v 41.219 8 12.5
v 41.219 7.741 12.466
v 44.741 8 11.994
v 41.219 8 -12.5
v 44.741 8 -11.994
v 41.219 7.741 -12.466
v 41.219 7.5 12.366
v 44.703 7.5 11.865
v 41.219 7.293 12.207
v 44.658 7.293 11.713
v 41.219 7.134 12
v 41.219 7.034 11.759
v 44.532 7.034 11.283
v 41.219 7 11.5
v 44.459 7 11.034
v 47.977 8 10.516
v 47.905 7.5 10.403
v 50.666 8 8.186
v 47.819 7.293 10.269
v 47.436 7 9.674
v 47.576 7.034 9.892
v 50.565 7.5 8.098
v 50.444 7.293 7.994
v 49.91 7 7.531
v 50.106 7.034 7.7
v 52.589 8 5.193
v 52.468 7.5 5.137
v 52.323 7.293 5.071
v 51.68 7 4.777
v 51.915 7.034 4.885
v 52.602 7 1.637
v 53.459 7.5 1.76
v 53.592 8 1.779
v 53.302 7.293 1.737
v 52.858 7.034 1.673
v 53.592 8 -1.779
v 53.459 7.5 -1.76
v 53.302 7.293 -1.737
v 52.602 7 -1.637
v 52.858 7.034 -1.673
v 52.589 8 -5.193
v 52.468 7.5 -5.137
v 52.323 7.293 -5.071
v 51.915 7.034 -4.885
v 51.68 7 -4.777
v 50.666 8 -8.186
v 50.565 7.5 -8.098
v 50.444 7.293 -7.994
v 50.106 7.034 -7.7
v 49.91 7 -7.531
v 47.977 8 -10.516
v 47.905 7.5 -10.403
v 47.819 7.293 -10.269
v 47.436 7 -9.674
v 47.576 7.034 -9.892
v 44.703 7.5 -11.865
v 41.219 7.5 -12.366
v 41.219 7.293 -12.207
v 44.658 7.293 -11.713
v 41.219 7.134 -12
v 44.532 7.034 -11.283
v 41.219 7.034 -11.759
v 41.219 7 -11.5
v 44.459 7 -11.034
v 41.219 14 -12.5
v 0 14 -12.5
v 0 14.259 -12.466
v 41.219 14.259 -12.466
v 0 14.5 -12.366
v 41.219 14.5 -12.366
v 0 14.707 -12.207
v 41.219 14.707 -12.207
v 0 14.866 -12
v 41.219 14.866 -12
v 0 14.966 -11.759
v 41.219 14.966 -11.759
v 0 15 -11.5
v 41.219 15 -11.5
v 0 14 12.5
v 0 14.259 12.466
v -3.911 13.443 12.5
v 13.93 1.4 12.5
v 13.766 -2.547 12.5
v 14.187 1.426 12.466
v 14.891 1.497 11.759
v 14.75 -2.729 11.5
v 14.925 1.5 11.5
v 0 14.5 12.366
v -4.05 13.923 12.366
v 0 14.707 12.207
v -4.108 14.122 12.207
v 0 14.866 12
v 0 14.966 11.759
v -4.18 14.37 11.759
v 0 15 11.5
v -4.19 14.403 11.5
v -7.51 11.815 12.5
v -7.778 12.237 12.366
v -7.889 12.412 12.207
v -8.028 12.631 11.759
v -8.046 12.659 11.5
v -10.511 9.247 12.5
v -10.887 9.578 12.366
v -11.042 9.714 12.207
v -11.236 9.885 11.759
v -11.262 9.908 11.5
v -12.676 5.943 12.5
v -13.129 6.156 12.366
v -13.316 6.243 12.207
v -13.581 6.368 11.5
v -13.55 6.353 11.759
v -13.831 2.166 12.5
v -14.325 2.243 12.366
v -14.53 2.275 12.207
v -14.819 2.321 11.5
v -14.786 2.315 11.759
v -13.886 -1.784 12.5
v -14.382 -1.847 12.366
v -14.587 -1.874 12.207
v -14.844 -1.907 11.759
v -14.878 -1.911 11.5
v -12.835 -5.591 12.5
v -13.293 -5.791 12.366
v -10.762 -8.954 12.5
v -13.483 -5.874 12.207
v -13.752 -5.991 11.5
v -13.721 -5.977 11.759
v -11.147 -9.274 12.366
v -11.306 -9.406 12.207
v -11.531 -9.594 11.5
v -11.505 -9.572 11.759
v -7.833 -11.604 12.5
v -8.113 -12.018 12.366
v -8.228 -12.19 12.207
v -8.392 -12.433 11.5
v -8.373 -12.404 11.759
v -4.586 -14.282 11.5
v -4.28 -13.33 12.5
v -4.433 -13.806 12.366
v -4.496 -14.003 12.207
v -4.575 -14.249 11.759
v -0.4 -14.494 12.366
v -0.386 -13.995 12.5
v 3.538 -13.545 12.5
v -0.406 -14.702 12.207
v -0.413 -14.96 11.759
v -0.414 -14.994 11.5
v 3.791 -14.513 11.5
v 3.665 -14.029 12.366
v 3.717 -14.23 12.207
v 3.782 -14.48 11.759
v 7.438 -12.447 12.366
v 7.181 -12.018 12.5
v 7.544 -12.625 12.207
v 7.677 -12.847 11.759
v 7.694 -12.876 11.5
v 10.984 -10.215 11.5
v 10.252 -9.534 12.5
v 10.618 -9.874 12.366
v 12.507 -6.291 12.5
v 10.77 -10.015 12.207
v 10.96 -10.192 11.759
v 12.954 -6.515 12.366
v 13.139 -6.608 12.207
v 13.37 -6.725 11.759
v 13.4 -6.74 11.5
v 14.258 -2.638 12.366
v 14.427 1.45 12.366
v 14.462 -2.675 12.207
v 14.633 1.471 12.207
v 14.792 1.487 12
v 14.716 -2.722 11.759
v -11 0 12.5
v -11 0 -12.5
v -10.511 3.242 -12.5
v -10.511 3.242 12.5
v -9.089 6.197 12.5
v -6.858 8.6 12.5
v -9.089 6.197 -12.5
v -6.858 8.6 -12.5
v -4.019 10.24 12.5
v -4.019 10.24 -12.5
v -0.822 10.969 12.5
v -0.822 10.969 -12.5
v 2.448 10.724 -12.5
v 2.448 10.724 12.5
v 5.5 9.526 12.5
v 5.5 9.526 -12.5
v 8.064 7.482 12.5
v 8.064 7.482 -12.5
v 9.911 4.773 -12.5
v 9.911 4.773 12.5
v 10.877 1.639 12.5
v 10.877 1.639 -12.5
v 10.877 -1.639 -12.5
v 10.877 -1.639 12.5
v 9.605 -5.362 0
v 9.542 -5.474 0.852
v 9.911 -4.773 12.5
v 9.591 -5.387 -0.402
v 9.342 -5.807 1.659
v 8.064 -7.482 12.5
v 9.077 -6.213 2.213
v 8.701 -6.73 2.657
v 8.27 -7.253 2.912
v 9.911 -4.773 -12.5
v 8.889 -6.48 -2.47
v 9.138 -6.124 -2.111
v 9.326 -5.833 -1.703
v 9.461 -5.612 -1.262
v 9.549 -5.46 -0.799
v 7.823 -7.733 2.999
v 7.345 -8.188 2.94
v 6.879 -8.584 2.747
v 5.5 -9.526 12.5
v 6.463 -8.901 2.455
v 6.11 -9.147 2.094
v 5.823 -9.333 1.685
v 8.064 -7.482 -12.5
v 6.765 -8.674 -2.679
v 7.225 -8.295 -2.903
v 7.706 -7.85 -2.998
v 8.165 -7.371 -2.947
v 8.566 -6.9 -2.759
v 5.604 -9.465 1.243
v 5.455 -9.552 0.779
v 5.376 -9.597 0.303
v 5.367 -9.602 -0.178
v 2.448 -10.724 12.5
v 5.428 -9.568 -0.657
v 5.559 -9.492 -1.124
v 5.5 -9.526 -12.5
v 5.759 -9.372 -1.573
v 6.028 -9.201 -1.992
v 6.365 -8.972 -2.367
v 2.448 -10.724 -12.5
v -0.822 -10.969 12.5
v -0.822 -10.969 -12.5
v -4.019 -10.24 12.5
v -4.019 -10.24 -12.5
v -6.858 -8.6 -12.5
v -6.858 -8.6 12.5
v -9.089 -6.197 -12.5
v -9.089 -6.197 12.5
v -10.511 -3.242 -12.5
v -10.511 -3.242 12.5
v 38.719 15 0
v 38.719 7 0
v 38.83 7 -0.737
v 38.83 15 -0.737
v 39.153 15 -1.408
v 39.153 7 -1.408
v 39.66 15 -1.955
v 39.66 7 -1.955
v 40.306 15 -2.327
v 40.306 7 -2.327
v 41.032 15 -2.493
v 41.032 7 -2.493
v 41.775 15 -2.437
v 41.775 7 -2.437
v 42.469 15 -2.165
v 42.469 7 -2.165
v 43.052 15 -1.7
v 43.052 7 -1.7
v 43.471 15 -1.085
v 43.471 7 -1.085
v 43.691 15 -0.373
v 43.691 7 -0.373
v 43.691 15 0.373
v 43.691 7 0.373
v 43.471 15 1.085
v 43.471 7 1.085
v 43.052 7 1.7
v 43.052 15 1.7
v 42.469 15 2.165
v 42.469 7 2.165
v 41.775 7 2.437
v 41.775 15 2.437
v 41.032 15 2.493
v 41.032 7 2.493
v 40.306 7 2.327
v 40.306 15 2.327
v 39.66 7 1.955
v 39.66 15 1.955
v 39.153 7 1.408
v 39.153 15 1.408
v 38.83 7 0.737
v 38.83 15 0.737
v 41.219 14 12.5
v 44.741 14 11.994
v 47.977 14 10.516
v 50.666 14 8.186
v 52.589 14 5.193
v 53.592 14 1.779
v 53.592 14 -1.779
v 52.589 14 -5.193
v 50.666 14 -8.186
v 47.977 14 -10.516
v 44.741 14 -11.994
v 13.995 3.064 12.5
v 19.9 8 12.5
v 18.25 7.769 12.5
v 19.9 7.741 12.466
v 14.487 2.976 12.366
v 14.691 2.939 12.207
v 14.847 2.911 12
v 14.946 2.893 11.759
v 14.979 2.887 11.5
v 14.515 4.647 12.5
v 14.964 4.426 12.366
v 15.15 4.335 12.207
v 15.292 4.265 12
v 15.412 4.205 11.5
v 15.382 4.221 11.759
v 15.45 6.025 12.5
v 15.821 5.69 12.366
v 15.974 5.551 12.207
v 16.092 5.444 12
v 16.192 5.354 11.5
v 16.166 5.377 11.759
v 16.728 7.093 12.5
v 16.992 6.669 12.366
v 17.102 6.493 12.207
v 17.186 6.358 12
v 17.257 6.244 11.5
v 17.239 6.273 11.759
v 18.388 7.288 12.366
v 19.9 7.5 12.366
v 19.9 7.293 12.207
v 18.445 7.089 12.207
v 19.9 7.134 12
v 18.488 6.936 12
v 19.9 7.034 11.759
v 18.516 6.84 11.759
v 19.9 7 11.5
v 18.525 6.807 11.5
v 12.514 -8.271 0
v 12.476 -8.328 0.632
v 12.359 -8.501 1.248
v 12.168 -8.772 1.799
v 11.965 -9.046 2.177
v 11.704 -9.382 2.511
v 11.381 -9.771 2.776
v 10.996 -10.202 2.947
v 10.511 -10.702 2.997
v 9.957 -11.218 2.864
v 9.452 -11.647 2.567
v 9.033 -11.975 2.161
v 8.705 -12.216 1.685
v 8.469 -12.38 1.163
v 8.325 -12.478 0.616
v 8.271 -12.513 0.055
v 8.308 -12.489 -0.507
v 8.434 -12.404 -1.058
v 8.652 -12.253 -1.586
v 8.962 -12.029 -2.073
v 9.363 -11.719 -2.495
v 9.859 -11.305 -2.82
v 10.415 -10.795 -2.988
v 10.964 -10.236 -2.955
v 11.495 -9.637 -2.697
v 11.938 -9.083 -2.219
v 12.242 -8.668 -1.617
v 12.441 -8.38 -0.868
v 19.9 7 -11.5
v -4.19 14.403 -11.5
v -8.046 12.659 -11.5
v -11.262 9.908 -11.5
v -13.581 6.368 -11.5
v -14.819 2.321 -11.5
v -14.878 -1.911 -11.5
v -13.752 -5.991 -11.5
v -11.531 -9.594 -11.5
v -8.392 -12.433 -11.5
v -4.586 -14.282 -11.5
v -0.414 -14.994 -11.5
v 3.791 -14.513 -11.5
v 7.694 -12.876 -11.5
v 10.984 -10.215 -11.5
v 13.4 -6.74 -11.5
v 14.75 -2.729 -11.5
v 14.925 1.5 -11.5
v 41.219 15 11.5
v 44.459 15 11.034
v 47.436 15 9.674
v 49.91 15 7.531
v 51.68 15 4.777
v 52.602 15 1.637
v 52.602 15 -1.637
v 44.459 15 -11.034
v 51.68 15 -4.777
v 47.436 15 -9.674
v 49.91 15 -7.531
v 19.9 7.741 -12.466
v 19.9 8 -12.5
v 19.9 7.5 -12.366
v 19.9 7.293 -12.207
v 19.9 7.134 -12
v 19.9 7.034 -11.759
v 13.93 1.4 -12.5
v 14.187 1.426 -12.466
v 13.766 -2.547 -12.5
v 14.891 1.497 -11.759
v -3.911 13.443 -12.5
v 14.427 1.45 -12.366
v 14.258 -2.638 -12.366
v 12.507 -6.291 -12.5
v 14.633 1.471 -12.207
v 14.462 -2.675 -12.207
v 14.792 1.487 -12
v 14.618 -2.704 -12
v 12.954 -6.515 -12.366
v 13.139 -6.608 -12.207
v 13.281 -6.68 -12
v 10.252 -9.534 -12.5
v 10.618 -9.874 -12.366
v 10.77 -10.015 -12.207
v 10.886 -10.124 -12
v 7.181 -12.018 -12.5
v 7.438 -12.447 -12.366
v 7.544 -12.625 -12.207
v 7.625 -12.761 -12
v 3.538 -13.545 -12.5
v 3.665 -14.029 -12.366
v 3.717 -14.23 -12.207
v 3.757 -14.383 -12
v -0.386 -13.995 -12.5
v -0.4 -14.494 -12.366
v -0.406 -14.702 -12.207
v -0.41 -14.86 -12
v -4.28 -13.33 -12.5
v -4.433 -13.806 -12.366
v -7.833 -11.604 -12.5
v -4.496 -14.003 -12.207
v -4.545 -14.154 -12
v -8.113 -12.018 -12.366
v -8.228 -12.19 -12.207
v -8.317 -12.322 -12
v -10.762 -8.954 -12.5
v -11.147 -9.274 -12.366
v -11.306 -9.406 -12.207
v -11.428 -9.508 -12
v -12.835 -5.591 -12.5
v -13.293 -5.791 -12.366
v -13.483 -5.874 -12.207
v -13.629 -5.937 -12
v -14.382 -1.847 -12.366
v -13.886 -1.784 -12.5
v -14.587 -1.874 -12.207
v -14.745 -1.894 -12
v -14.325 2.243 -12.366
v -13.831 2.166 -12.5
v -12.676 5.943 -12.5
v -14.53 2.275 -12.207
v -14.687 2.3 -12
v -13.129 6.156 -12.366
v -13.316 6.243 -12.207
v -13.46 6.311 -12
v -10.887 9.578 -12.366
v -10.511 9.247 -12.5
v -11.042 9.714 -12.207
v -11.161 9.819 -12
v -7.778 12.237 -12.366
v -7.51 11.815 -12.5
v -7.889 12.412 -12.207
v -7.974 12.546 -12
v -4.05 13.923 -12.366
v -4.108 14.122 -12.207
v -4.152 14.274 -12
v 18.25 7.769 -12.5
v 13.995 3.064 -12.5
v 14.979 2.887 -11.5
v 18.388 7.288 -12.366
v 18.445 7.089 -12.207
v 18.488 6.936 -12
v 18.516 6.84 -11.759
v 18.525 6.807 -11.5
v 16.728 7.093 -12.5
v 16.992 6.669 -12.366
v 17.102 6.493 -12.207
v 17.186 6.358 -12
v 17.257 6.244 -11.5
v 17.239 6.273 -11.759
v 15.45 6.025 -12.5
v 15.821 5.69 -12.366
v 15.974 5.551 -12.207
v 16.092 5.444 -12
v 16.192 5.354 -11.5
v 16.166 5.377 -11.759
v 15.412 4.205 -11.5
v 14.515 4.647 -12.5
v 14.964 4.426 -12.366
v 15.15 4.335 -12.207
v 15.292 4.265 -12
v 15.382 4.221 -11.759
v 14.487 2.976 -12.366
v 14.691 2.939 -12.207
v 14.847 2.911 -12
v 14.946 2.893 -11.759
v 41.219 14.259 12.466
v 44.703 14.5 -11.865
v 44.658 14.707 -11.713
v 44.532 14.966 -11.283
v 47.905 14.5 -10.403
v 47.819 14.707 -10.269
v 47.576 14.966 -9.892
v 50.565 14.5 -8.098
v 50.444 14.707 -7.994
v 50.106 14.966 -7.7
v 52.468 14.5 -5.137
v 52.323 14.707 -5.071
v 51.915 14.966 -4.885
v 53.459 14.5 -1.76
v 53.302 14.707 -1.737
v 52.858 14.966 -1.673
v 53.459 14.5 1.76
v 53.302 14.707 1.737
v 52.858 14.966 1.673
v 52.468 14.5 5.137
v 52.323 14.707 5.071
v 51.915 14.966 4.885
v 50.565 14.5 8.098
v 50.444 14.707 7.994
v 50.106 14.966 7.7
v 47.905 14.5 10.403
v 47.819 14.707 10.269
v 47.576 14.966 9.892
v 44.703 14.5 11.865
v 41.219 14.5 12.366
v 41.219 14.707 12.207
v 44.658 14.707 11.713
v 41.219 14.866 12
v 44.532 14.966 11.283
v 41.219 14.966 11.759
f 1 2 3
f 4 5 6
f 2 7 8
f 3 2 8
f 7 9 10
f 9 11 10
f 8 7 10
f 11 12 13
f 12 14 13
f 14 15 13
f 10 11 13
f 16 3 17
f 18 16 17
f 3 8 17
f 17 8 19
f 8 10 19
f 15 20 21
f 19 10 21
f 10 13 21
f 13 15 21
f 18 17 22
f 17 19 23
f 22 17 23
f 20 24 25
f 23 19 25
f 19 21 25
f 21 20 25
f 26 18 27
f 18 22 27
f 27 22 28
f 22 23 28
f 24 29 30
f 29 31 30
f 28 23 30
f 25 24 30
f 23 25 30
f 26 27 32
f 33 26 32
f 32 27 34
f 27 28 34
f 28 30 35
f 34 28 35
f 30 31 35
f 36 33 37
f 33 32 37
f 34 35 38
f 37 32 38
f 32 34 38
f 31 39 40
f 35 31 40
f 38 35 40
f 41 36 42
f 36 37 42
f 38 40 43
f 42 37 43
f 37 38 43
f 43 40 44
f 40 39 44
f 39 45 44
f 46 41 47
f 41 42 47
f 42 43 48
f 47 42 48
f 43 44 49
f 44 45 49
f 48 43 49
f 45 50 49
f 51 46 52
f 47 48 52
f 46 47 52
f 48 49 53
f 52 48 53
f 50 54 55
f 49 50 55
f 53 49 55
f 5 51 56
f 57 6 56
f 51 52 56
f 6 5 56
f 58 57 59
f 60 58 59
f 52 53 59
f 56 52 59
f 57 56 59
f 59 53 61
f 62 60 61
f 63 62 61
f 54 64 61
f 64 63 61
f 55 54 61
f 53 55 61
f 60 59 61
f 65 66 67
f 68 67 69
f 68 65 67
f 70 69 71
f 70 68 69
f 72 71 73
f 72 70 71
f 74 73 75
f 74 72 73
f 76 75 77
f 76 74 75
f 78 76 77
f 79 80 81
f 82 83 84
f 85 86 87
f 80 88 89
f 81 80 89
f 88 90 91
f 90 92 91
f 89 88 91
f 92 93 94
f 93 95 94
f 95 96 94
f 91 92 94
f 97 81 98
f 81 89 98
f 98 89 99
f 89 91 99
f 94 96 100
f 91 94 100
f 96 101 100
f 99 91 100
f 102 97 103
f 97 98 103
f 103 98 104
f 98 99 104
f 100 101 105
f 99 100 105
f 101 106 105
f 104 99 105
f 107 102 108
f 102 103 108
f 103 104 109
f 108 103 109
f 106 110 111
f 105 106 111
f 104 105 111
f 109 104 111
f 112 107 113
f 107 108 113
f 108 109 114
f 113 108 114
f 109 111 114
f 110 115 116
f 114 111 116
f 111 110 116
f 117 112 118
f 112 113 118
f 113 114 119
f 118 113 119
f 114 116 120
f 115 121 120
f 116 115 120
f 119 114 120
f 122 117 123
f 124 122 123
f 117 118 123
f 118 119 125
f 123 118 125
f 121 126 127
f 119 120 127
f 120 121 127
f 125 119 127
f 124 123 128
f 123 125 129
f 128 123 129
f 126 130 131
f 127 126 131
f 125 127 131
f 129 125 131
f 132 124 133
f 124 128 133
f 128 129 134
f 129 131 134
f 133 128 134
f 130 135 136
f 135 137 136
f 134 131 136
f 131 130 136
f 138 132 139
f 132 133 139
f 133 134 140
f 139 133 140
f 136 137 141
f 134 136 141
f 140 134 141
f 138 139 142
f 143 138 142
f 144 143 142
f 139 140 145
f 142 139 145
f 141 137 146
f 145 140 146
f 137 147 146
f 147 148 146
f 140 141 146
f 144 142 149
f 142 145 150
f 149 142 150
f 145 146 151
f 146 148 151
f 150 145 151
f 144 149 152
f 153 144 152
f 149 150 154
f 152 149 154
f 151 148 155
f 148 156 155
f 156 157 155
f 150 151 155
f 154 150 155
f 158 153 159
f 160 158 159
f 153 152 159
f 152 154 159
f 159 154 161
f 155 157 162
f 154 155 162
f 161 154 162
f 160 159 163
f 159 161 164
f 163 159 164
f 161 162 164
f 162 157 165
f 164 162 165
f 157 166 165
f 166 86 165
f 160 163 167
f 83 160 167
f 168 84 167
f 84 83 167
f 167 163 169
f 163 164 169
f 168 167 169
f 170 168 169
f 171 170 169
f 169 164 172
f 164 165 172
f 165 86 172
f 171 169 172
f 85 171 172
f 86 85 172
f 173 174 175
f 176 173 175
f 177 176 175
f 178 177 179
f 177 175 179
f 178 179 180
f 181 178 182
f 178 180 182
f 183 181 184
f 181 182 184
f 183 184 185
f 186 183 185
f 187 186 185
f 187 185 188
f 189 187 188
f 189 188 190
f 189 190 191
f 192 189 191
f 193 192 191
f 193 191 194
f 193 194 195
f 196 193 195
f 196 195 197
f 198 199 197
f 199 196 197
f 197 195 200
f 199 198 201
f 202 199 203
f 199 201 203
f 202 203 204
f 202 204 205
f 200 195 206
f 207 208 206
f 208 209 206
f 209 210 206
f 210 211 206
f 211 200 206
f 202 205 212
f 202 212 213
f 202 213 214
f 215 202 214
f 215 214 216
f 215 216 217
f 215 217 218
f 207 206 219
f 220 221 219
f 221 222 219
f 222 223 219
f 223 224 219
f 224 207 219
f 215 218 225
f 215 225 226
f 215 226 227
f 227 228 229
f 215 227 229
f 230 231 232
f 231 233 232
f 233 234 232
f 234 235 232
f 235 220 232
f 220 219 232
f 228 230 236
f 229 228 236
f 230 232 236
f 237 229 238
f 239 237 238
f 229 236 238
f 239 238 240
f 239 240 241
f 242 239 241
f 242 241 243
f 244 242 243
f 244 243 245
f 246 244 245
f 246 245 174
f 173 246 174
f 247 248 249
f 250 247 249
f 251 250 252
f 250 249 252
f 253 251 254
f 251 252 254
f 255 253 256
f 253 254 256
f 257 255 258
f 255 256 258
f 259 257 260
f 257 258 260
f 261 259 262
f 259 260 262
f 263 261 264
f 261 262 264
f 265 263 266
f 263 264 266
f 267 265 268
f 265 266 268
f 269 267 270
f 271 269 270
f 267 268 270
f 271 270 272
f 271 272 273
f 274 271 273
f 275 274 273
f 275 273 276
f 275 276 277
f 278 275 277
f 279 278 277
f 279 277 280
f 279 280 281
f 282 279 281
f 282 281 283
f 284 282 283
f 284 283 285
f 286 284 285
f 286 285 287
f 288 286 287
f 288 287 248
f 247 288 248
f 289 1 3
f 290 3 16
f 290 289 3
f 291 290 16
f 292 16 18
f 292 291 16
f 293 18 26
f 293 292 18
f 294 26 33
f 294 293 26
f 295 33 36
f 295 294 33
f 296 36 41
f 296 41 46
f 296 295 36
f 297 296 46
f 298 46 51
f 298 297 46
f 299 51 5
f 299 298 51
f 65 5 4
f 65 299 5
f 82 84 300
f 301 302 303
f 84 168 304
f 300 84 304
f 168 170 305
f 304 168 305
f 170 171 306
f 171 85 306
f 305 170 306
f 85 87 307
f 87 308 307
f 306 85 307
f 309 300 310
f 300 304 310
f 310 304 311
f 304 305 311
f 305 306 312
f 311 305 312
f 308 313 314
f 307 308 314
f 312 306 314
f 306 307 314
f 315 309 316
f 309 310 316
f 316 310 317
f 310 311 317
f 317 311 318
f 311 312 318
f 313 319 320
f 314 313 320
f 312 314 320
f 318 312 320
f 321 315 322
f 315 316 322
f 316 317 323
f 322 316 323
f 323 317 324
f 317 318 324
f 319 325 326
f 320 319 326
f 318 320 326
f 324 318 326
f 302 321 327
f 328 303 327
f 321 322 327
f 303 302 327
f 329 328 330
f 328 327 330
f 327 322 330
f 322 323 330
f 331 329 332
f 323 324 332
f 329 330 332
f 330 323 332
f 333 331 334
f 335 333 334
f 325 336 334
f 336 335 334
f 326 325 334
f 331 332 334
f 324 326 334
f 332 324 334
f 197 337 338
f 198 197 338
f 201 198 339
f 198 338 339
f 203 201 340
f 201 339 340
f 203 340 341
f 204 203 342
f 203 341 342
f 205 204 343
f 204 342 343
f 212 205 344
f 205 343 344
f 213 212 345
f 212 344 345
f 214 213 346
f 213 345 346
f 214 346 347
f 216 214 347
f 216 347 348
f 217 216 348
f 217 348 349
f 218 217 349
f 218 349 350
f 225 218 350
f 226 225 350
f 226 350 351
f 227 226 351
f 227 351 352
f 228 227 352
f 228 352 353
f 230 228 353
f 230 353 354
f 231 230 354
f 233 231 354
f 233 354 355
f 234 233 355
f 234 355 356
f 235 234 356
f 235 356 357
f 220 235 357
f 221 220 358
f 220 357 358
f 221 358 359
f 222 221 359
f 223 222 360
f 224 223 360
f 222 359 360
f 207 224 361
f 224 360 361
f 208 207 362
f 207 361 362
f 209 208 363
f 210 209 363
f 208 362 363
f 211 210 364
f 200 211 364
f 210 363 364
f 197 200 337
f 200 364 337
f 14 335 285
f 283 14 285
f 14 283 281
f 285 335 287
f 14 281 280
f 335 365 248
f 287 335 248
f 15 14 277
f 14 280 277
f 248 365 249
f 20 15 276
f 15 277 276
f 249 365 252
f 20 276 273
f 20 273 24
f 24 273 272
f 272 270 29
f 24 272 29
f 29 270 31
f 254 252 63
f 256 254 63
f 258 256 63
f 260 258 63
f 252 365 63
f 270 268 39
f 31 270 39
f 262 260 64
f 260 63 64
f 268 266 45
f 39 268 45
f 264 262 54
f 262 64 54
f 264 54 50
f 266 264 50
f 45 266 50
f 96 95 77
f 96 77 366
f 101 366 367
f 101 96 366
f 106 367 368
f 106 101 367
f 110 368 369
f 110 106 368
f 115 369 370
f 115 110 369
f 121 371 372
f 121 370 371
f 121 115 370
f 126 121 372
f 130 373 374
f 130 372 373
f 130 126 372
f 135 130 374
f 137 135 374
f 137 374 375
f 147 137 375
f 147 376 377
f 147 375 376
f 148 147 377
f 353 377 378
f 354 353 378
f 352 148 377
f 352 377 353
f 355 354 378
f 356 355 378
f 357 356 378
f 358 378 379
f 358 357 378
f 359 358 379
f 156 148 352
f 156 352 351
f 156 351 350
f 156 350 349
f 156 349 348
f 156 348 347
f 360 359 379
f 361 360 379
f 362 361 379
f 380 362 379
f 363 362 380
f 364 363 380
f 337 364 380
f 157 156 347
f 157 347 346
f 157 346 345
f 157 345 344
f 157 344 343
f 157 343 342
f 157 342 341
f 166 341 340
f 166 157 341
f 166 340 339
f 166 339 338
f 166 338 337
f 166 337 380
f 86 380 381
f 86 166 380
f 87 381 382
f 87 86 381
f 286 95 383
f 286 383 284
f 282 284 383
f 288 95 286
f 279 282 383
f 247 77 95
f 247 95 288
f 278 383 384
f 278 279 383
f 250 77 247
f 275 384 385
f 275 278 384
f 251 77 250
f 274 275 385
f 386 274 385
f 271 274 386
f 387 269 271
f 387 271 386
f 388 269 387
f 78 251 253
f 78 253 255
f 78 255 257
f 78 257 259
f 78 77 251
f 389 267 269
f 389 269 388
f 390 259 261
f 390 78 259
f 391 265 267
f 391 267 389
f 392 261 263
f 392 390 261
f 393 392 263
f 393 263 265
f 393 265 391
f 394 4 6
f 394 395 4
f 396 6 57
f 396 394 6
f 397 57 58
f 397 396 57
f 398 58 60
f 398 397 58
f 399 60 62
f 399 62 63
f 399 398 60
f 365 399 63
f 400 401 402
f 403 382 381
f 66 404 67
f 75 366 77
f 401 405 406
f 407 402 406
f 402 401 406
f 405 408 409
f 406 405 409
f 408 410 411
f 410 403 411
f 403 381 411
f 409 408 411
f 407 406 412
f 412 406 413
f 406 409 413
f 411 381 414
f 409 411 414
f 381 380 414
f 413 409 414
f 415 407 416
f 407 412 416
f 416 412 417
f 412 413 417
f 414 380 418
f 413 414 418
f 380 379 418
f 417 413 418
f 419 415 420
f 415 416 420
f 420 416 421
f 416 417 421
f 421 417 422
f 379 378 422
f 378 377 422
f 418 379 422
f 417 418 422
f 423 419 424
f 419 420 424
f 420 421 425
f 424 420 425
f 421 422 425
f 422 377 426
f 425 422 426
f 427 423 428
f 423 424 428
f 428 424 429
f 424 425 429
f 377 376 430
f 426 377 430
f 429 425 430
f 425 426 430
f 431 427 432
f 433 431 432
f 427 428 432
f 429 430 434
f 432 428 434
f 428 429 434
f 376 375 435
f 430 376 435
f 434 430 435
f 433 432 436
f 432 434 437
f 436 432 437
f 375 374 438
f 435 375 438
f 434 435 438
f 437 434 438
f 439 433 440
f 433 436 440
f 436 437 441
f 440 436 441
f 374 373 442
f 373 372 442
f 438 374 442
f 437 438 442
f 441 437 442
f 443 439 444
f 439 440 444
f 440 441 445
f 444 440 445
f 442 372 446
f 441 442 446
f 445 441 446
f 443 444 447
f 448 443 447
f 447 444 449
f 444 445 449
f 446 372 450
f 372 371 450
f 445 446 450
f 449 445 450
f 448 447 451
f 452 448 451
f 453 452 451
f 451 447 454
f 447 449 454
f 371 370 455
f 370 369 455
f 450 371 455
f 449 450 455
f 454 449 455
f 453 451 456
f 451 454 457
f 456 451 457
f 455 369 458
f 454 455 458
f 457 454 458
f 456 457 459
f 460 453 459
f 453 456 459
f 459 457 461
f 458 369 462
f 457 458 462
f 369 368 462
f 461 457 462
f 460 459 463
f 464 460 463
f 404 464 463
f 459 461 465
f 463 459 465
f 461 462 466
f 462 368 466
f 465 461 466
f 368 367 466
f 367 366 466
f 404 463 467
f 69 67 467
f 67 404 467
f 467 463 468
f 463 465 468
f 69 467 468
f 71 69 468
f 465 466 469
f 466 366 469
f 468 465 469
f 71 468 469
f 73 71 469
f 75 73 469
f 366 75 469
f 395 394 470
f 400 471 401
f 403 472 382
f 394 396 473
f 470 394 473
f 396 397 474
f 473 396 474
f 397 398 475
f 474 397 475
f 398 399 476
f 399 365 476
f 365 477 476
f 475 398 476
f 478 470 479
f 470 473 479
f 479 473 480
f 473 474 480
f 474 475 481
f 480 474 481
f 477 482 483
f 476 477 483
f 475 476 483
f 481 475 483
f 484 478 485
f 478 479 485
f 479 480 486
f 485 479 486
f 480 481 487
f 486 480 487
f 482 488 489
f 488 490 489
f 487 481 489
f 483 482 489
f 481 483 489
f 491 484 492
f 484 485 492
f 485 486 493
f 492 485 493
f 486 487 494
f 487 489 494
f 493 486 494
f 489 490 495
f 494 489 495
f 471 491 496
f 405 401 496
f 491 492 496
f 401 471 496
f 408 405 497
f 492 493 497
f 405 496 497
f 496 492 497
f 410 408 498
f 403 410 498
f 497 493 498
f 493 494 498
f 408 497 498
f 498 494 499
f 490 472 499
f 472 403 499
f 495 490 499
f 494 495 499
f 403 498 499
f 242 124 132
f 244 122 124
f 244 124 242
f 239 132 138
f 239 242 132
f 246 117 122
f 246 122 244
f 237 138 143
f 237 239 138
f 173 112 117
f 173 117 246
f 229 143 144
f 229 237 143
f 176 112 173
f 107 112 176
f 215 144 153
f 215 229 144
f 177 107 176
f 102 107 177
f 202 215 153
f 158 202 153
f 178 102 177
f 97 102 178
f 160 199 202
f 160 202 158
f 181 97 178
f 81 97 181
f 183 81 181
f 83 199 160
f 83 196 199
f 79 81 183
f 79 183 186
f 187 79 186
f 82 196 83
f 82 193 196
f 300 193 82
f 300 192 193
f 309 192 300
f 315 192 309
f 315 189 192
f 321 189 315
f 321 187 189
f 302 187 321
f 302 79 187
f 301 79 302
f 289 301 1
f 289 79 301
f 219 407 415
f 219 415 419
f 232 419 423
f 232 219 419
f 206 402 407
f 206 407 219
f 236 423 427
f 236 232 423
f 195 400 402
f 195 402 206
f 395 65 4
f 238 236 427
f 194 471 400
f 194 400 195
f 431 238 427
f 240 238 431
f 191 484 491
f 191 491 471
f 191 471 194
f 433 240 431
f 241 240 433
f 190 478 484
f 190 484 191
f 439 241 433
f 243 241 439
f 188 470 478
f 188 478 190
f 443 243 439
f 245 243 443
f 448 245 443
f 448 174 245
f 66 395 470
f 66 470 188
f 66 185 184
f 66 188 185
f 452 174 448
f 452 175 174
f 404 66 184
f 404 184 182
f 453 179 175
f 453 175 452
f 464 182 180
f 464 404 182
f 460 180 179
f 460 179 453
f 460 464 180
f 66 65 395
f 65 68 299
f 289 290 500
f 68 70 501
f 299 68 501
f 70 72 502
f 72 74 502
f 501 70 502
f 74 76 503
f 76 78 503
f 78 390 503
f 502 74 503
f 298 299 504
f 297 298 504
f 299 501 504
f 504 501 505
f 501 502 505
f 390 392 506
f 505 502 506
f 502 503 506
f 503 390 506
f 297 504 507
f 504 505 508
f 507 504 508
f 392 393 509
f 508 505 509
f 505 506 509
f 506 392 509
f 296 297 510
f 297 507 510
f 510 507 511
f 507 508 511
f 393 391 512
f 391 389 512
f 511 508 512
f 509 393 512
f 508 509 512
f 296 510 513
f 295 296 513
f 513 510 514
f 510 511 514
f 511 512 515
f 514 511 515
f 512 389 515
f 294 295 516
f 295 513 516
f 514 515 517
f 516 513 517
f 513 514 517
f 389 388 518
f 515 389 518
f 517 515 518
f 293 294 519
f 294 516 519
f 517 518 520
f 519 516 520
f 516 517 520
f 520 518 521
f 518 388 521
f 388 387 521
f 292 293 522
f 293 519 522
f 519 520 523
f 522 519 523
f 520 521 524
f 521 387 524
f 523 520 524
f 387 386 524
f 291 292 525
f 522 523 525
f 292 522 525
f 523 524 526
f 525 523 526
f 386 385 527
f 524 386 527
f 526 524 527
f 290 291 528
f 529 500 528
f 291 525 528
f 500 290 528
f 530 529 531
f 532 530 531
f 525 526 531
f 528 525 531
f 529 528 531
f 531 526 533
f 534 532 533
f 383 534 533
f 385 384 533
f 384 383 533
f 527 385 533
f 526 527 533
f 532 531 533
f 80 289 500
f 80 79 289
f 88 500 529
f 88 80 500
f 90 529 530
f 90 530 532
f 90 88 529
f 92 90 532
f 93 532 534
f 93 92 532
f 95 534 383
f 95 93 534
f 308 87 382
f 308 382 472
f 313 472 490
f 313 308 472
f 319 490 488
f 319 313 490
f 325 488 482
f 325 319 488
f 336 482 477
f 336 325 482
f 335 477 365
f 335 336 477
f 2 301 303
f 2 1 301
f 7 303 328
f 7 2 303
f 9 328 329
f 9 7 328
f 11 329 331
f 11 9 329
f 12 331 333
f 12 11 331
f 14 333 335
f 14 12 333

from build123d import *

# Parameters (mm, degrees)
ESBO_O1_R                  = 15
RESSALTO_EXTRUS_O1_DEPTH   = 12.5
RESSALTO_EXTRUS_O2_DEPTH   = 8
FILETE1_R                  = 5
ESBO_O3_R                  = 11
CORTE_EXTRUS_O1_DEPTH      = 62.120606846
CORTE_EXTRUS_O2_REACH      = 53.678
CORTE_EXTRUS_O2_END_RADIUS = 11
ESBO_O6_R                  = 3
FURO_ROSCADO_DE_M62_D      = 5
FILETE2_R                  = 1


with BuildPart() as part:
    # Esboço1 → Ressalto-extrusão1 (new, symmetric)
    with BuildSketch(Plane.XY):
        Circle(ESBO_O1_R)
    extrude(amount=RESSALTO_EXTRUS_O1_DEPTH, both=True)

    # Esboço2 → Ressalto-extrusão2 (add)
    with BuildSketch(Plane(origin=(0, 15, 0), x_dir=(1, 0, 0), z_dir=(0, 1, 0))):
        with BuildLine():
            Line((41.21897785, 12.5), (0, 12.5))
            Line((0, 12.5), (0, -12.5))
            Line((0, -12.5), (41.21897785, -12.5))
            ThreePointArc((41.21897785, -12.5), (53.71897785, 0), (41.21897785, 12.5))
        make_face()
    extrude(amount=-RESSALTO_EXTRUS_O2_DEPTH)

    # Filete1
    filete1_edges = [part.edges().sort_by_distance(p)[0] for p in [
        (13.266499161, 7, 0),
    ]]
    fillet(filete1_edges, radius=FILETE1_R)

    # Esboço3 → Corte-extrusão1 (cut, through all)
    with BuildSketch(Plane(origin=(0, 0, -12.5), x_dir=(-1, 0, 0), z_dir=(0, 0, -1))):
        Circle(ESBO_O3_R)
    extrude(amount=-CORTE_EXTRUS_O1_DEPTH, mode=Mode.SUBTRACT)

    # Corte-extrusão2: up to this cylinder (the profile starts outside it)
    corte_extrus_o2_end = Plane(origin=(0, 0, 0), z_dir=(0, 0, -1)) * Cylinder(CORTE_EXTRUS_O2_END_RADIUS, 130.356, mode=Mode.PRIVATE)
    # Esboço6 → Corte-extrusão2 (cut, up to the surface)
    with BuildSketch(Plane(origin=(10.606601718, -10.606601718, 0), x_dir=(0, 0, -1), z_dir=(0.7071067811865464, -0.7071067811865488, 0)), mode=Mode.PRIVATE) as corte_extrus_o2_sk1:
        with Locations(Location((0, 0, 0), (0, 0, 90))):
            Circle(ESBO_O6_R)
    corte_extrus_o2_tool1 = extrude(corte_extrus_o2_sk1.sketch, amount=-CORTE_EXTRUS_O2_REACH, mode=Mode.PRIVATE) - corte_extrus_o2_end
    add(corte_extrus_o2_tool1.solids().sort_by_distance((10.606602, -10.606602, 0))[0], mode=Mode.SUBTRACT)

    # Furo roscado de M62 (through all)
    with Locations(Plane(origin=(0, 15, 0), x_dir=(1, 0, 0), z_dir=(0, 1, 0))):
        with Locations((41.21897785, 0)):
            Hole(FURO_ROSCADO_DE_M62_D / 2)

    # Filete2
    filete2_edges = [part.edges().sort_by_distance(p)[0] for p in [
        (30.559363296, 7, -12.5),
        (53.71897785, 15, 0),
        (20.609488925, 15, -12.5),
        (20.609488925, 15, 12.5),
        (30.559363296, 7, 12.5),
        (16.191649499, 5.354101966, -12.5),
        (16.191649499, 5.354101966, 12.5),
        (-10.062305899, -11.124297731, -12.5),
        (-10.062305899, -11.124297731, 12.5),
        (53.71897785, 7, 0),
    ]]
    fillet(filete2_edges, radius=FILETE2_R)


solid = part.part
